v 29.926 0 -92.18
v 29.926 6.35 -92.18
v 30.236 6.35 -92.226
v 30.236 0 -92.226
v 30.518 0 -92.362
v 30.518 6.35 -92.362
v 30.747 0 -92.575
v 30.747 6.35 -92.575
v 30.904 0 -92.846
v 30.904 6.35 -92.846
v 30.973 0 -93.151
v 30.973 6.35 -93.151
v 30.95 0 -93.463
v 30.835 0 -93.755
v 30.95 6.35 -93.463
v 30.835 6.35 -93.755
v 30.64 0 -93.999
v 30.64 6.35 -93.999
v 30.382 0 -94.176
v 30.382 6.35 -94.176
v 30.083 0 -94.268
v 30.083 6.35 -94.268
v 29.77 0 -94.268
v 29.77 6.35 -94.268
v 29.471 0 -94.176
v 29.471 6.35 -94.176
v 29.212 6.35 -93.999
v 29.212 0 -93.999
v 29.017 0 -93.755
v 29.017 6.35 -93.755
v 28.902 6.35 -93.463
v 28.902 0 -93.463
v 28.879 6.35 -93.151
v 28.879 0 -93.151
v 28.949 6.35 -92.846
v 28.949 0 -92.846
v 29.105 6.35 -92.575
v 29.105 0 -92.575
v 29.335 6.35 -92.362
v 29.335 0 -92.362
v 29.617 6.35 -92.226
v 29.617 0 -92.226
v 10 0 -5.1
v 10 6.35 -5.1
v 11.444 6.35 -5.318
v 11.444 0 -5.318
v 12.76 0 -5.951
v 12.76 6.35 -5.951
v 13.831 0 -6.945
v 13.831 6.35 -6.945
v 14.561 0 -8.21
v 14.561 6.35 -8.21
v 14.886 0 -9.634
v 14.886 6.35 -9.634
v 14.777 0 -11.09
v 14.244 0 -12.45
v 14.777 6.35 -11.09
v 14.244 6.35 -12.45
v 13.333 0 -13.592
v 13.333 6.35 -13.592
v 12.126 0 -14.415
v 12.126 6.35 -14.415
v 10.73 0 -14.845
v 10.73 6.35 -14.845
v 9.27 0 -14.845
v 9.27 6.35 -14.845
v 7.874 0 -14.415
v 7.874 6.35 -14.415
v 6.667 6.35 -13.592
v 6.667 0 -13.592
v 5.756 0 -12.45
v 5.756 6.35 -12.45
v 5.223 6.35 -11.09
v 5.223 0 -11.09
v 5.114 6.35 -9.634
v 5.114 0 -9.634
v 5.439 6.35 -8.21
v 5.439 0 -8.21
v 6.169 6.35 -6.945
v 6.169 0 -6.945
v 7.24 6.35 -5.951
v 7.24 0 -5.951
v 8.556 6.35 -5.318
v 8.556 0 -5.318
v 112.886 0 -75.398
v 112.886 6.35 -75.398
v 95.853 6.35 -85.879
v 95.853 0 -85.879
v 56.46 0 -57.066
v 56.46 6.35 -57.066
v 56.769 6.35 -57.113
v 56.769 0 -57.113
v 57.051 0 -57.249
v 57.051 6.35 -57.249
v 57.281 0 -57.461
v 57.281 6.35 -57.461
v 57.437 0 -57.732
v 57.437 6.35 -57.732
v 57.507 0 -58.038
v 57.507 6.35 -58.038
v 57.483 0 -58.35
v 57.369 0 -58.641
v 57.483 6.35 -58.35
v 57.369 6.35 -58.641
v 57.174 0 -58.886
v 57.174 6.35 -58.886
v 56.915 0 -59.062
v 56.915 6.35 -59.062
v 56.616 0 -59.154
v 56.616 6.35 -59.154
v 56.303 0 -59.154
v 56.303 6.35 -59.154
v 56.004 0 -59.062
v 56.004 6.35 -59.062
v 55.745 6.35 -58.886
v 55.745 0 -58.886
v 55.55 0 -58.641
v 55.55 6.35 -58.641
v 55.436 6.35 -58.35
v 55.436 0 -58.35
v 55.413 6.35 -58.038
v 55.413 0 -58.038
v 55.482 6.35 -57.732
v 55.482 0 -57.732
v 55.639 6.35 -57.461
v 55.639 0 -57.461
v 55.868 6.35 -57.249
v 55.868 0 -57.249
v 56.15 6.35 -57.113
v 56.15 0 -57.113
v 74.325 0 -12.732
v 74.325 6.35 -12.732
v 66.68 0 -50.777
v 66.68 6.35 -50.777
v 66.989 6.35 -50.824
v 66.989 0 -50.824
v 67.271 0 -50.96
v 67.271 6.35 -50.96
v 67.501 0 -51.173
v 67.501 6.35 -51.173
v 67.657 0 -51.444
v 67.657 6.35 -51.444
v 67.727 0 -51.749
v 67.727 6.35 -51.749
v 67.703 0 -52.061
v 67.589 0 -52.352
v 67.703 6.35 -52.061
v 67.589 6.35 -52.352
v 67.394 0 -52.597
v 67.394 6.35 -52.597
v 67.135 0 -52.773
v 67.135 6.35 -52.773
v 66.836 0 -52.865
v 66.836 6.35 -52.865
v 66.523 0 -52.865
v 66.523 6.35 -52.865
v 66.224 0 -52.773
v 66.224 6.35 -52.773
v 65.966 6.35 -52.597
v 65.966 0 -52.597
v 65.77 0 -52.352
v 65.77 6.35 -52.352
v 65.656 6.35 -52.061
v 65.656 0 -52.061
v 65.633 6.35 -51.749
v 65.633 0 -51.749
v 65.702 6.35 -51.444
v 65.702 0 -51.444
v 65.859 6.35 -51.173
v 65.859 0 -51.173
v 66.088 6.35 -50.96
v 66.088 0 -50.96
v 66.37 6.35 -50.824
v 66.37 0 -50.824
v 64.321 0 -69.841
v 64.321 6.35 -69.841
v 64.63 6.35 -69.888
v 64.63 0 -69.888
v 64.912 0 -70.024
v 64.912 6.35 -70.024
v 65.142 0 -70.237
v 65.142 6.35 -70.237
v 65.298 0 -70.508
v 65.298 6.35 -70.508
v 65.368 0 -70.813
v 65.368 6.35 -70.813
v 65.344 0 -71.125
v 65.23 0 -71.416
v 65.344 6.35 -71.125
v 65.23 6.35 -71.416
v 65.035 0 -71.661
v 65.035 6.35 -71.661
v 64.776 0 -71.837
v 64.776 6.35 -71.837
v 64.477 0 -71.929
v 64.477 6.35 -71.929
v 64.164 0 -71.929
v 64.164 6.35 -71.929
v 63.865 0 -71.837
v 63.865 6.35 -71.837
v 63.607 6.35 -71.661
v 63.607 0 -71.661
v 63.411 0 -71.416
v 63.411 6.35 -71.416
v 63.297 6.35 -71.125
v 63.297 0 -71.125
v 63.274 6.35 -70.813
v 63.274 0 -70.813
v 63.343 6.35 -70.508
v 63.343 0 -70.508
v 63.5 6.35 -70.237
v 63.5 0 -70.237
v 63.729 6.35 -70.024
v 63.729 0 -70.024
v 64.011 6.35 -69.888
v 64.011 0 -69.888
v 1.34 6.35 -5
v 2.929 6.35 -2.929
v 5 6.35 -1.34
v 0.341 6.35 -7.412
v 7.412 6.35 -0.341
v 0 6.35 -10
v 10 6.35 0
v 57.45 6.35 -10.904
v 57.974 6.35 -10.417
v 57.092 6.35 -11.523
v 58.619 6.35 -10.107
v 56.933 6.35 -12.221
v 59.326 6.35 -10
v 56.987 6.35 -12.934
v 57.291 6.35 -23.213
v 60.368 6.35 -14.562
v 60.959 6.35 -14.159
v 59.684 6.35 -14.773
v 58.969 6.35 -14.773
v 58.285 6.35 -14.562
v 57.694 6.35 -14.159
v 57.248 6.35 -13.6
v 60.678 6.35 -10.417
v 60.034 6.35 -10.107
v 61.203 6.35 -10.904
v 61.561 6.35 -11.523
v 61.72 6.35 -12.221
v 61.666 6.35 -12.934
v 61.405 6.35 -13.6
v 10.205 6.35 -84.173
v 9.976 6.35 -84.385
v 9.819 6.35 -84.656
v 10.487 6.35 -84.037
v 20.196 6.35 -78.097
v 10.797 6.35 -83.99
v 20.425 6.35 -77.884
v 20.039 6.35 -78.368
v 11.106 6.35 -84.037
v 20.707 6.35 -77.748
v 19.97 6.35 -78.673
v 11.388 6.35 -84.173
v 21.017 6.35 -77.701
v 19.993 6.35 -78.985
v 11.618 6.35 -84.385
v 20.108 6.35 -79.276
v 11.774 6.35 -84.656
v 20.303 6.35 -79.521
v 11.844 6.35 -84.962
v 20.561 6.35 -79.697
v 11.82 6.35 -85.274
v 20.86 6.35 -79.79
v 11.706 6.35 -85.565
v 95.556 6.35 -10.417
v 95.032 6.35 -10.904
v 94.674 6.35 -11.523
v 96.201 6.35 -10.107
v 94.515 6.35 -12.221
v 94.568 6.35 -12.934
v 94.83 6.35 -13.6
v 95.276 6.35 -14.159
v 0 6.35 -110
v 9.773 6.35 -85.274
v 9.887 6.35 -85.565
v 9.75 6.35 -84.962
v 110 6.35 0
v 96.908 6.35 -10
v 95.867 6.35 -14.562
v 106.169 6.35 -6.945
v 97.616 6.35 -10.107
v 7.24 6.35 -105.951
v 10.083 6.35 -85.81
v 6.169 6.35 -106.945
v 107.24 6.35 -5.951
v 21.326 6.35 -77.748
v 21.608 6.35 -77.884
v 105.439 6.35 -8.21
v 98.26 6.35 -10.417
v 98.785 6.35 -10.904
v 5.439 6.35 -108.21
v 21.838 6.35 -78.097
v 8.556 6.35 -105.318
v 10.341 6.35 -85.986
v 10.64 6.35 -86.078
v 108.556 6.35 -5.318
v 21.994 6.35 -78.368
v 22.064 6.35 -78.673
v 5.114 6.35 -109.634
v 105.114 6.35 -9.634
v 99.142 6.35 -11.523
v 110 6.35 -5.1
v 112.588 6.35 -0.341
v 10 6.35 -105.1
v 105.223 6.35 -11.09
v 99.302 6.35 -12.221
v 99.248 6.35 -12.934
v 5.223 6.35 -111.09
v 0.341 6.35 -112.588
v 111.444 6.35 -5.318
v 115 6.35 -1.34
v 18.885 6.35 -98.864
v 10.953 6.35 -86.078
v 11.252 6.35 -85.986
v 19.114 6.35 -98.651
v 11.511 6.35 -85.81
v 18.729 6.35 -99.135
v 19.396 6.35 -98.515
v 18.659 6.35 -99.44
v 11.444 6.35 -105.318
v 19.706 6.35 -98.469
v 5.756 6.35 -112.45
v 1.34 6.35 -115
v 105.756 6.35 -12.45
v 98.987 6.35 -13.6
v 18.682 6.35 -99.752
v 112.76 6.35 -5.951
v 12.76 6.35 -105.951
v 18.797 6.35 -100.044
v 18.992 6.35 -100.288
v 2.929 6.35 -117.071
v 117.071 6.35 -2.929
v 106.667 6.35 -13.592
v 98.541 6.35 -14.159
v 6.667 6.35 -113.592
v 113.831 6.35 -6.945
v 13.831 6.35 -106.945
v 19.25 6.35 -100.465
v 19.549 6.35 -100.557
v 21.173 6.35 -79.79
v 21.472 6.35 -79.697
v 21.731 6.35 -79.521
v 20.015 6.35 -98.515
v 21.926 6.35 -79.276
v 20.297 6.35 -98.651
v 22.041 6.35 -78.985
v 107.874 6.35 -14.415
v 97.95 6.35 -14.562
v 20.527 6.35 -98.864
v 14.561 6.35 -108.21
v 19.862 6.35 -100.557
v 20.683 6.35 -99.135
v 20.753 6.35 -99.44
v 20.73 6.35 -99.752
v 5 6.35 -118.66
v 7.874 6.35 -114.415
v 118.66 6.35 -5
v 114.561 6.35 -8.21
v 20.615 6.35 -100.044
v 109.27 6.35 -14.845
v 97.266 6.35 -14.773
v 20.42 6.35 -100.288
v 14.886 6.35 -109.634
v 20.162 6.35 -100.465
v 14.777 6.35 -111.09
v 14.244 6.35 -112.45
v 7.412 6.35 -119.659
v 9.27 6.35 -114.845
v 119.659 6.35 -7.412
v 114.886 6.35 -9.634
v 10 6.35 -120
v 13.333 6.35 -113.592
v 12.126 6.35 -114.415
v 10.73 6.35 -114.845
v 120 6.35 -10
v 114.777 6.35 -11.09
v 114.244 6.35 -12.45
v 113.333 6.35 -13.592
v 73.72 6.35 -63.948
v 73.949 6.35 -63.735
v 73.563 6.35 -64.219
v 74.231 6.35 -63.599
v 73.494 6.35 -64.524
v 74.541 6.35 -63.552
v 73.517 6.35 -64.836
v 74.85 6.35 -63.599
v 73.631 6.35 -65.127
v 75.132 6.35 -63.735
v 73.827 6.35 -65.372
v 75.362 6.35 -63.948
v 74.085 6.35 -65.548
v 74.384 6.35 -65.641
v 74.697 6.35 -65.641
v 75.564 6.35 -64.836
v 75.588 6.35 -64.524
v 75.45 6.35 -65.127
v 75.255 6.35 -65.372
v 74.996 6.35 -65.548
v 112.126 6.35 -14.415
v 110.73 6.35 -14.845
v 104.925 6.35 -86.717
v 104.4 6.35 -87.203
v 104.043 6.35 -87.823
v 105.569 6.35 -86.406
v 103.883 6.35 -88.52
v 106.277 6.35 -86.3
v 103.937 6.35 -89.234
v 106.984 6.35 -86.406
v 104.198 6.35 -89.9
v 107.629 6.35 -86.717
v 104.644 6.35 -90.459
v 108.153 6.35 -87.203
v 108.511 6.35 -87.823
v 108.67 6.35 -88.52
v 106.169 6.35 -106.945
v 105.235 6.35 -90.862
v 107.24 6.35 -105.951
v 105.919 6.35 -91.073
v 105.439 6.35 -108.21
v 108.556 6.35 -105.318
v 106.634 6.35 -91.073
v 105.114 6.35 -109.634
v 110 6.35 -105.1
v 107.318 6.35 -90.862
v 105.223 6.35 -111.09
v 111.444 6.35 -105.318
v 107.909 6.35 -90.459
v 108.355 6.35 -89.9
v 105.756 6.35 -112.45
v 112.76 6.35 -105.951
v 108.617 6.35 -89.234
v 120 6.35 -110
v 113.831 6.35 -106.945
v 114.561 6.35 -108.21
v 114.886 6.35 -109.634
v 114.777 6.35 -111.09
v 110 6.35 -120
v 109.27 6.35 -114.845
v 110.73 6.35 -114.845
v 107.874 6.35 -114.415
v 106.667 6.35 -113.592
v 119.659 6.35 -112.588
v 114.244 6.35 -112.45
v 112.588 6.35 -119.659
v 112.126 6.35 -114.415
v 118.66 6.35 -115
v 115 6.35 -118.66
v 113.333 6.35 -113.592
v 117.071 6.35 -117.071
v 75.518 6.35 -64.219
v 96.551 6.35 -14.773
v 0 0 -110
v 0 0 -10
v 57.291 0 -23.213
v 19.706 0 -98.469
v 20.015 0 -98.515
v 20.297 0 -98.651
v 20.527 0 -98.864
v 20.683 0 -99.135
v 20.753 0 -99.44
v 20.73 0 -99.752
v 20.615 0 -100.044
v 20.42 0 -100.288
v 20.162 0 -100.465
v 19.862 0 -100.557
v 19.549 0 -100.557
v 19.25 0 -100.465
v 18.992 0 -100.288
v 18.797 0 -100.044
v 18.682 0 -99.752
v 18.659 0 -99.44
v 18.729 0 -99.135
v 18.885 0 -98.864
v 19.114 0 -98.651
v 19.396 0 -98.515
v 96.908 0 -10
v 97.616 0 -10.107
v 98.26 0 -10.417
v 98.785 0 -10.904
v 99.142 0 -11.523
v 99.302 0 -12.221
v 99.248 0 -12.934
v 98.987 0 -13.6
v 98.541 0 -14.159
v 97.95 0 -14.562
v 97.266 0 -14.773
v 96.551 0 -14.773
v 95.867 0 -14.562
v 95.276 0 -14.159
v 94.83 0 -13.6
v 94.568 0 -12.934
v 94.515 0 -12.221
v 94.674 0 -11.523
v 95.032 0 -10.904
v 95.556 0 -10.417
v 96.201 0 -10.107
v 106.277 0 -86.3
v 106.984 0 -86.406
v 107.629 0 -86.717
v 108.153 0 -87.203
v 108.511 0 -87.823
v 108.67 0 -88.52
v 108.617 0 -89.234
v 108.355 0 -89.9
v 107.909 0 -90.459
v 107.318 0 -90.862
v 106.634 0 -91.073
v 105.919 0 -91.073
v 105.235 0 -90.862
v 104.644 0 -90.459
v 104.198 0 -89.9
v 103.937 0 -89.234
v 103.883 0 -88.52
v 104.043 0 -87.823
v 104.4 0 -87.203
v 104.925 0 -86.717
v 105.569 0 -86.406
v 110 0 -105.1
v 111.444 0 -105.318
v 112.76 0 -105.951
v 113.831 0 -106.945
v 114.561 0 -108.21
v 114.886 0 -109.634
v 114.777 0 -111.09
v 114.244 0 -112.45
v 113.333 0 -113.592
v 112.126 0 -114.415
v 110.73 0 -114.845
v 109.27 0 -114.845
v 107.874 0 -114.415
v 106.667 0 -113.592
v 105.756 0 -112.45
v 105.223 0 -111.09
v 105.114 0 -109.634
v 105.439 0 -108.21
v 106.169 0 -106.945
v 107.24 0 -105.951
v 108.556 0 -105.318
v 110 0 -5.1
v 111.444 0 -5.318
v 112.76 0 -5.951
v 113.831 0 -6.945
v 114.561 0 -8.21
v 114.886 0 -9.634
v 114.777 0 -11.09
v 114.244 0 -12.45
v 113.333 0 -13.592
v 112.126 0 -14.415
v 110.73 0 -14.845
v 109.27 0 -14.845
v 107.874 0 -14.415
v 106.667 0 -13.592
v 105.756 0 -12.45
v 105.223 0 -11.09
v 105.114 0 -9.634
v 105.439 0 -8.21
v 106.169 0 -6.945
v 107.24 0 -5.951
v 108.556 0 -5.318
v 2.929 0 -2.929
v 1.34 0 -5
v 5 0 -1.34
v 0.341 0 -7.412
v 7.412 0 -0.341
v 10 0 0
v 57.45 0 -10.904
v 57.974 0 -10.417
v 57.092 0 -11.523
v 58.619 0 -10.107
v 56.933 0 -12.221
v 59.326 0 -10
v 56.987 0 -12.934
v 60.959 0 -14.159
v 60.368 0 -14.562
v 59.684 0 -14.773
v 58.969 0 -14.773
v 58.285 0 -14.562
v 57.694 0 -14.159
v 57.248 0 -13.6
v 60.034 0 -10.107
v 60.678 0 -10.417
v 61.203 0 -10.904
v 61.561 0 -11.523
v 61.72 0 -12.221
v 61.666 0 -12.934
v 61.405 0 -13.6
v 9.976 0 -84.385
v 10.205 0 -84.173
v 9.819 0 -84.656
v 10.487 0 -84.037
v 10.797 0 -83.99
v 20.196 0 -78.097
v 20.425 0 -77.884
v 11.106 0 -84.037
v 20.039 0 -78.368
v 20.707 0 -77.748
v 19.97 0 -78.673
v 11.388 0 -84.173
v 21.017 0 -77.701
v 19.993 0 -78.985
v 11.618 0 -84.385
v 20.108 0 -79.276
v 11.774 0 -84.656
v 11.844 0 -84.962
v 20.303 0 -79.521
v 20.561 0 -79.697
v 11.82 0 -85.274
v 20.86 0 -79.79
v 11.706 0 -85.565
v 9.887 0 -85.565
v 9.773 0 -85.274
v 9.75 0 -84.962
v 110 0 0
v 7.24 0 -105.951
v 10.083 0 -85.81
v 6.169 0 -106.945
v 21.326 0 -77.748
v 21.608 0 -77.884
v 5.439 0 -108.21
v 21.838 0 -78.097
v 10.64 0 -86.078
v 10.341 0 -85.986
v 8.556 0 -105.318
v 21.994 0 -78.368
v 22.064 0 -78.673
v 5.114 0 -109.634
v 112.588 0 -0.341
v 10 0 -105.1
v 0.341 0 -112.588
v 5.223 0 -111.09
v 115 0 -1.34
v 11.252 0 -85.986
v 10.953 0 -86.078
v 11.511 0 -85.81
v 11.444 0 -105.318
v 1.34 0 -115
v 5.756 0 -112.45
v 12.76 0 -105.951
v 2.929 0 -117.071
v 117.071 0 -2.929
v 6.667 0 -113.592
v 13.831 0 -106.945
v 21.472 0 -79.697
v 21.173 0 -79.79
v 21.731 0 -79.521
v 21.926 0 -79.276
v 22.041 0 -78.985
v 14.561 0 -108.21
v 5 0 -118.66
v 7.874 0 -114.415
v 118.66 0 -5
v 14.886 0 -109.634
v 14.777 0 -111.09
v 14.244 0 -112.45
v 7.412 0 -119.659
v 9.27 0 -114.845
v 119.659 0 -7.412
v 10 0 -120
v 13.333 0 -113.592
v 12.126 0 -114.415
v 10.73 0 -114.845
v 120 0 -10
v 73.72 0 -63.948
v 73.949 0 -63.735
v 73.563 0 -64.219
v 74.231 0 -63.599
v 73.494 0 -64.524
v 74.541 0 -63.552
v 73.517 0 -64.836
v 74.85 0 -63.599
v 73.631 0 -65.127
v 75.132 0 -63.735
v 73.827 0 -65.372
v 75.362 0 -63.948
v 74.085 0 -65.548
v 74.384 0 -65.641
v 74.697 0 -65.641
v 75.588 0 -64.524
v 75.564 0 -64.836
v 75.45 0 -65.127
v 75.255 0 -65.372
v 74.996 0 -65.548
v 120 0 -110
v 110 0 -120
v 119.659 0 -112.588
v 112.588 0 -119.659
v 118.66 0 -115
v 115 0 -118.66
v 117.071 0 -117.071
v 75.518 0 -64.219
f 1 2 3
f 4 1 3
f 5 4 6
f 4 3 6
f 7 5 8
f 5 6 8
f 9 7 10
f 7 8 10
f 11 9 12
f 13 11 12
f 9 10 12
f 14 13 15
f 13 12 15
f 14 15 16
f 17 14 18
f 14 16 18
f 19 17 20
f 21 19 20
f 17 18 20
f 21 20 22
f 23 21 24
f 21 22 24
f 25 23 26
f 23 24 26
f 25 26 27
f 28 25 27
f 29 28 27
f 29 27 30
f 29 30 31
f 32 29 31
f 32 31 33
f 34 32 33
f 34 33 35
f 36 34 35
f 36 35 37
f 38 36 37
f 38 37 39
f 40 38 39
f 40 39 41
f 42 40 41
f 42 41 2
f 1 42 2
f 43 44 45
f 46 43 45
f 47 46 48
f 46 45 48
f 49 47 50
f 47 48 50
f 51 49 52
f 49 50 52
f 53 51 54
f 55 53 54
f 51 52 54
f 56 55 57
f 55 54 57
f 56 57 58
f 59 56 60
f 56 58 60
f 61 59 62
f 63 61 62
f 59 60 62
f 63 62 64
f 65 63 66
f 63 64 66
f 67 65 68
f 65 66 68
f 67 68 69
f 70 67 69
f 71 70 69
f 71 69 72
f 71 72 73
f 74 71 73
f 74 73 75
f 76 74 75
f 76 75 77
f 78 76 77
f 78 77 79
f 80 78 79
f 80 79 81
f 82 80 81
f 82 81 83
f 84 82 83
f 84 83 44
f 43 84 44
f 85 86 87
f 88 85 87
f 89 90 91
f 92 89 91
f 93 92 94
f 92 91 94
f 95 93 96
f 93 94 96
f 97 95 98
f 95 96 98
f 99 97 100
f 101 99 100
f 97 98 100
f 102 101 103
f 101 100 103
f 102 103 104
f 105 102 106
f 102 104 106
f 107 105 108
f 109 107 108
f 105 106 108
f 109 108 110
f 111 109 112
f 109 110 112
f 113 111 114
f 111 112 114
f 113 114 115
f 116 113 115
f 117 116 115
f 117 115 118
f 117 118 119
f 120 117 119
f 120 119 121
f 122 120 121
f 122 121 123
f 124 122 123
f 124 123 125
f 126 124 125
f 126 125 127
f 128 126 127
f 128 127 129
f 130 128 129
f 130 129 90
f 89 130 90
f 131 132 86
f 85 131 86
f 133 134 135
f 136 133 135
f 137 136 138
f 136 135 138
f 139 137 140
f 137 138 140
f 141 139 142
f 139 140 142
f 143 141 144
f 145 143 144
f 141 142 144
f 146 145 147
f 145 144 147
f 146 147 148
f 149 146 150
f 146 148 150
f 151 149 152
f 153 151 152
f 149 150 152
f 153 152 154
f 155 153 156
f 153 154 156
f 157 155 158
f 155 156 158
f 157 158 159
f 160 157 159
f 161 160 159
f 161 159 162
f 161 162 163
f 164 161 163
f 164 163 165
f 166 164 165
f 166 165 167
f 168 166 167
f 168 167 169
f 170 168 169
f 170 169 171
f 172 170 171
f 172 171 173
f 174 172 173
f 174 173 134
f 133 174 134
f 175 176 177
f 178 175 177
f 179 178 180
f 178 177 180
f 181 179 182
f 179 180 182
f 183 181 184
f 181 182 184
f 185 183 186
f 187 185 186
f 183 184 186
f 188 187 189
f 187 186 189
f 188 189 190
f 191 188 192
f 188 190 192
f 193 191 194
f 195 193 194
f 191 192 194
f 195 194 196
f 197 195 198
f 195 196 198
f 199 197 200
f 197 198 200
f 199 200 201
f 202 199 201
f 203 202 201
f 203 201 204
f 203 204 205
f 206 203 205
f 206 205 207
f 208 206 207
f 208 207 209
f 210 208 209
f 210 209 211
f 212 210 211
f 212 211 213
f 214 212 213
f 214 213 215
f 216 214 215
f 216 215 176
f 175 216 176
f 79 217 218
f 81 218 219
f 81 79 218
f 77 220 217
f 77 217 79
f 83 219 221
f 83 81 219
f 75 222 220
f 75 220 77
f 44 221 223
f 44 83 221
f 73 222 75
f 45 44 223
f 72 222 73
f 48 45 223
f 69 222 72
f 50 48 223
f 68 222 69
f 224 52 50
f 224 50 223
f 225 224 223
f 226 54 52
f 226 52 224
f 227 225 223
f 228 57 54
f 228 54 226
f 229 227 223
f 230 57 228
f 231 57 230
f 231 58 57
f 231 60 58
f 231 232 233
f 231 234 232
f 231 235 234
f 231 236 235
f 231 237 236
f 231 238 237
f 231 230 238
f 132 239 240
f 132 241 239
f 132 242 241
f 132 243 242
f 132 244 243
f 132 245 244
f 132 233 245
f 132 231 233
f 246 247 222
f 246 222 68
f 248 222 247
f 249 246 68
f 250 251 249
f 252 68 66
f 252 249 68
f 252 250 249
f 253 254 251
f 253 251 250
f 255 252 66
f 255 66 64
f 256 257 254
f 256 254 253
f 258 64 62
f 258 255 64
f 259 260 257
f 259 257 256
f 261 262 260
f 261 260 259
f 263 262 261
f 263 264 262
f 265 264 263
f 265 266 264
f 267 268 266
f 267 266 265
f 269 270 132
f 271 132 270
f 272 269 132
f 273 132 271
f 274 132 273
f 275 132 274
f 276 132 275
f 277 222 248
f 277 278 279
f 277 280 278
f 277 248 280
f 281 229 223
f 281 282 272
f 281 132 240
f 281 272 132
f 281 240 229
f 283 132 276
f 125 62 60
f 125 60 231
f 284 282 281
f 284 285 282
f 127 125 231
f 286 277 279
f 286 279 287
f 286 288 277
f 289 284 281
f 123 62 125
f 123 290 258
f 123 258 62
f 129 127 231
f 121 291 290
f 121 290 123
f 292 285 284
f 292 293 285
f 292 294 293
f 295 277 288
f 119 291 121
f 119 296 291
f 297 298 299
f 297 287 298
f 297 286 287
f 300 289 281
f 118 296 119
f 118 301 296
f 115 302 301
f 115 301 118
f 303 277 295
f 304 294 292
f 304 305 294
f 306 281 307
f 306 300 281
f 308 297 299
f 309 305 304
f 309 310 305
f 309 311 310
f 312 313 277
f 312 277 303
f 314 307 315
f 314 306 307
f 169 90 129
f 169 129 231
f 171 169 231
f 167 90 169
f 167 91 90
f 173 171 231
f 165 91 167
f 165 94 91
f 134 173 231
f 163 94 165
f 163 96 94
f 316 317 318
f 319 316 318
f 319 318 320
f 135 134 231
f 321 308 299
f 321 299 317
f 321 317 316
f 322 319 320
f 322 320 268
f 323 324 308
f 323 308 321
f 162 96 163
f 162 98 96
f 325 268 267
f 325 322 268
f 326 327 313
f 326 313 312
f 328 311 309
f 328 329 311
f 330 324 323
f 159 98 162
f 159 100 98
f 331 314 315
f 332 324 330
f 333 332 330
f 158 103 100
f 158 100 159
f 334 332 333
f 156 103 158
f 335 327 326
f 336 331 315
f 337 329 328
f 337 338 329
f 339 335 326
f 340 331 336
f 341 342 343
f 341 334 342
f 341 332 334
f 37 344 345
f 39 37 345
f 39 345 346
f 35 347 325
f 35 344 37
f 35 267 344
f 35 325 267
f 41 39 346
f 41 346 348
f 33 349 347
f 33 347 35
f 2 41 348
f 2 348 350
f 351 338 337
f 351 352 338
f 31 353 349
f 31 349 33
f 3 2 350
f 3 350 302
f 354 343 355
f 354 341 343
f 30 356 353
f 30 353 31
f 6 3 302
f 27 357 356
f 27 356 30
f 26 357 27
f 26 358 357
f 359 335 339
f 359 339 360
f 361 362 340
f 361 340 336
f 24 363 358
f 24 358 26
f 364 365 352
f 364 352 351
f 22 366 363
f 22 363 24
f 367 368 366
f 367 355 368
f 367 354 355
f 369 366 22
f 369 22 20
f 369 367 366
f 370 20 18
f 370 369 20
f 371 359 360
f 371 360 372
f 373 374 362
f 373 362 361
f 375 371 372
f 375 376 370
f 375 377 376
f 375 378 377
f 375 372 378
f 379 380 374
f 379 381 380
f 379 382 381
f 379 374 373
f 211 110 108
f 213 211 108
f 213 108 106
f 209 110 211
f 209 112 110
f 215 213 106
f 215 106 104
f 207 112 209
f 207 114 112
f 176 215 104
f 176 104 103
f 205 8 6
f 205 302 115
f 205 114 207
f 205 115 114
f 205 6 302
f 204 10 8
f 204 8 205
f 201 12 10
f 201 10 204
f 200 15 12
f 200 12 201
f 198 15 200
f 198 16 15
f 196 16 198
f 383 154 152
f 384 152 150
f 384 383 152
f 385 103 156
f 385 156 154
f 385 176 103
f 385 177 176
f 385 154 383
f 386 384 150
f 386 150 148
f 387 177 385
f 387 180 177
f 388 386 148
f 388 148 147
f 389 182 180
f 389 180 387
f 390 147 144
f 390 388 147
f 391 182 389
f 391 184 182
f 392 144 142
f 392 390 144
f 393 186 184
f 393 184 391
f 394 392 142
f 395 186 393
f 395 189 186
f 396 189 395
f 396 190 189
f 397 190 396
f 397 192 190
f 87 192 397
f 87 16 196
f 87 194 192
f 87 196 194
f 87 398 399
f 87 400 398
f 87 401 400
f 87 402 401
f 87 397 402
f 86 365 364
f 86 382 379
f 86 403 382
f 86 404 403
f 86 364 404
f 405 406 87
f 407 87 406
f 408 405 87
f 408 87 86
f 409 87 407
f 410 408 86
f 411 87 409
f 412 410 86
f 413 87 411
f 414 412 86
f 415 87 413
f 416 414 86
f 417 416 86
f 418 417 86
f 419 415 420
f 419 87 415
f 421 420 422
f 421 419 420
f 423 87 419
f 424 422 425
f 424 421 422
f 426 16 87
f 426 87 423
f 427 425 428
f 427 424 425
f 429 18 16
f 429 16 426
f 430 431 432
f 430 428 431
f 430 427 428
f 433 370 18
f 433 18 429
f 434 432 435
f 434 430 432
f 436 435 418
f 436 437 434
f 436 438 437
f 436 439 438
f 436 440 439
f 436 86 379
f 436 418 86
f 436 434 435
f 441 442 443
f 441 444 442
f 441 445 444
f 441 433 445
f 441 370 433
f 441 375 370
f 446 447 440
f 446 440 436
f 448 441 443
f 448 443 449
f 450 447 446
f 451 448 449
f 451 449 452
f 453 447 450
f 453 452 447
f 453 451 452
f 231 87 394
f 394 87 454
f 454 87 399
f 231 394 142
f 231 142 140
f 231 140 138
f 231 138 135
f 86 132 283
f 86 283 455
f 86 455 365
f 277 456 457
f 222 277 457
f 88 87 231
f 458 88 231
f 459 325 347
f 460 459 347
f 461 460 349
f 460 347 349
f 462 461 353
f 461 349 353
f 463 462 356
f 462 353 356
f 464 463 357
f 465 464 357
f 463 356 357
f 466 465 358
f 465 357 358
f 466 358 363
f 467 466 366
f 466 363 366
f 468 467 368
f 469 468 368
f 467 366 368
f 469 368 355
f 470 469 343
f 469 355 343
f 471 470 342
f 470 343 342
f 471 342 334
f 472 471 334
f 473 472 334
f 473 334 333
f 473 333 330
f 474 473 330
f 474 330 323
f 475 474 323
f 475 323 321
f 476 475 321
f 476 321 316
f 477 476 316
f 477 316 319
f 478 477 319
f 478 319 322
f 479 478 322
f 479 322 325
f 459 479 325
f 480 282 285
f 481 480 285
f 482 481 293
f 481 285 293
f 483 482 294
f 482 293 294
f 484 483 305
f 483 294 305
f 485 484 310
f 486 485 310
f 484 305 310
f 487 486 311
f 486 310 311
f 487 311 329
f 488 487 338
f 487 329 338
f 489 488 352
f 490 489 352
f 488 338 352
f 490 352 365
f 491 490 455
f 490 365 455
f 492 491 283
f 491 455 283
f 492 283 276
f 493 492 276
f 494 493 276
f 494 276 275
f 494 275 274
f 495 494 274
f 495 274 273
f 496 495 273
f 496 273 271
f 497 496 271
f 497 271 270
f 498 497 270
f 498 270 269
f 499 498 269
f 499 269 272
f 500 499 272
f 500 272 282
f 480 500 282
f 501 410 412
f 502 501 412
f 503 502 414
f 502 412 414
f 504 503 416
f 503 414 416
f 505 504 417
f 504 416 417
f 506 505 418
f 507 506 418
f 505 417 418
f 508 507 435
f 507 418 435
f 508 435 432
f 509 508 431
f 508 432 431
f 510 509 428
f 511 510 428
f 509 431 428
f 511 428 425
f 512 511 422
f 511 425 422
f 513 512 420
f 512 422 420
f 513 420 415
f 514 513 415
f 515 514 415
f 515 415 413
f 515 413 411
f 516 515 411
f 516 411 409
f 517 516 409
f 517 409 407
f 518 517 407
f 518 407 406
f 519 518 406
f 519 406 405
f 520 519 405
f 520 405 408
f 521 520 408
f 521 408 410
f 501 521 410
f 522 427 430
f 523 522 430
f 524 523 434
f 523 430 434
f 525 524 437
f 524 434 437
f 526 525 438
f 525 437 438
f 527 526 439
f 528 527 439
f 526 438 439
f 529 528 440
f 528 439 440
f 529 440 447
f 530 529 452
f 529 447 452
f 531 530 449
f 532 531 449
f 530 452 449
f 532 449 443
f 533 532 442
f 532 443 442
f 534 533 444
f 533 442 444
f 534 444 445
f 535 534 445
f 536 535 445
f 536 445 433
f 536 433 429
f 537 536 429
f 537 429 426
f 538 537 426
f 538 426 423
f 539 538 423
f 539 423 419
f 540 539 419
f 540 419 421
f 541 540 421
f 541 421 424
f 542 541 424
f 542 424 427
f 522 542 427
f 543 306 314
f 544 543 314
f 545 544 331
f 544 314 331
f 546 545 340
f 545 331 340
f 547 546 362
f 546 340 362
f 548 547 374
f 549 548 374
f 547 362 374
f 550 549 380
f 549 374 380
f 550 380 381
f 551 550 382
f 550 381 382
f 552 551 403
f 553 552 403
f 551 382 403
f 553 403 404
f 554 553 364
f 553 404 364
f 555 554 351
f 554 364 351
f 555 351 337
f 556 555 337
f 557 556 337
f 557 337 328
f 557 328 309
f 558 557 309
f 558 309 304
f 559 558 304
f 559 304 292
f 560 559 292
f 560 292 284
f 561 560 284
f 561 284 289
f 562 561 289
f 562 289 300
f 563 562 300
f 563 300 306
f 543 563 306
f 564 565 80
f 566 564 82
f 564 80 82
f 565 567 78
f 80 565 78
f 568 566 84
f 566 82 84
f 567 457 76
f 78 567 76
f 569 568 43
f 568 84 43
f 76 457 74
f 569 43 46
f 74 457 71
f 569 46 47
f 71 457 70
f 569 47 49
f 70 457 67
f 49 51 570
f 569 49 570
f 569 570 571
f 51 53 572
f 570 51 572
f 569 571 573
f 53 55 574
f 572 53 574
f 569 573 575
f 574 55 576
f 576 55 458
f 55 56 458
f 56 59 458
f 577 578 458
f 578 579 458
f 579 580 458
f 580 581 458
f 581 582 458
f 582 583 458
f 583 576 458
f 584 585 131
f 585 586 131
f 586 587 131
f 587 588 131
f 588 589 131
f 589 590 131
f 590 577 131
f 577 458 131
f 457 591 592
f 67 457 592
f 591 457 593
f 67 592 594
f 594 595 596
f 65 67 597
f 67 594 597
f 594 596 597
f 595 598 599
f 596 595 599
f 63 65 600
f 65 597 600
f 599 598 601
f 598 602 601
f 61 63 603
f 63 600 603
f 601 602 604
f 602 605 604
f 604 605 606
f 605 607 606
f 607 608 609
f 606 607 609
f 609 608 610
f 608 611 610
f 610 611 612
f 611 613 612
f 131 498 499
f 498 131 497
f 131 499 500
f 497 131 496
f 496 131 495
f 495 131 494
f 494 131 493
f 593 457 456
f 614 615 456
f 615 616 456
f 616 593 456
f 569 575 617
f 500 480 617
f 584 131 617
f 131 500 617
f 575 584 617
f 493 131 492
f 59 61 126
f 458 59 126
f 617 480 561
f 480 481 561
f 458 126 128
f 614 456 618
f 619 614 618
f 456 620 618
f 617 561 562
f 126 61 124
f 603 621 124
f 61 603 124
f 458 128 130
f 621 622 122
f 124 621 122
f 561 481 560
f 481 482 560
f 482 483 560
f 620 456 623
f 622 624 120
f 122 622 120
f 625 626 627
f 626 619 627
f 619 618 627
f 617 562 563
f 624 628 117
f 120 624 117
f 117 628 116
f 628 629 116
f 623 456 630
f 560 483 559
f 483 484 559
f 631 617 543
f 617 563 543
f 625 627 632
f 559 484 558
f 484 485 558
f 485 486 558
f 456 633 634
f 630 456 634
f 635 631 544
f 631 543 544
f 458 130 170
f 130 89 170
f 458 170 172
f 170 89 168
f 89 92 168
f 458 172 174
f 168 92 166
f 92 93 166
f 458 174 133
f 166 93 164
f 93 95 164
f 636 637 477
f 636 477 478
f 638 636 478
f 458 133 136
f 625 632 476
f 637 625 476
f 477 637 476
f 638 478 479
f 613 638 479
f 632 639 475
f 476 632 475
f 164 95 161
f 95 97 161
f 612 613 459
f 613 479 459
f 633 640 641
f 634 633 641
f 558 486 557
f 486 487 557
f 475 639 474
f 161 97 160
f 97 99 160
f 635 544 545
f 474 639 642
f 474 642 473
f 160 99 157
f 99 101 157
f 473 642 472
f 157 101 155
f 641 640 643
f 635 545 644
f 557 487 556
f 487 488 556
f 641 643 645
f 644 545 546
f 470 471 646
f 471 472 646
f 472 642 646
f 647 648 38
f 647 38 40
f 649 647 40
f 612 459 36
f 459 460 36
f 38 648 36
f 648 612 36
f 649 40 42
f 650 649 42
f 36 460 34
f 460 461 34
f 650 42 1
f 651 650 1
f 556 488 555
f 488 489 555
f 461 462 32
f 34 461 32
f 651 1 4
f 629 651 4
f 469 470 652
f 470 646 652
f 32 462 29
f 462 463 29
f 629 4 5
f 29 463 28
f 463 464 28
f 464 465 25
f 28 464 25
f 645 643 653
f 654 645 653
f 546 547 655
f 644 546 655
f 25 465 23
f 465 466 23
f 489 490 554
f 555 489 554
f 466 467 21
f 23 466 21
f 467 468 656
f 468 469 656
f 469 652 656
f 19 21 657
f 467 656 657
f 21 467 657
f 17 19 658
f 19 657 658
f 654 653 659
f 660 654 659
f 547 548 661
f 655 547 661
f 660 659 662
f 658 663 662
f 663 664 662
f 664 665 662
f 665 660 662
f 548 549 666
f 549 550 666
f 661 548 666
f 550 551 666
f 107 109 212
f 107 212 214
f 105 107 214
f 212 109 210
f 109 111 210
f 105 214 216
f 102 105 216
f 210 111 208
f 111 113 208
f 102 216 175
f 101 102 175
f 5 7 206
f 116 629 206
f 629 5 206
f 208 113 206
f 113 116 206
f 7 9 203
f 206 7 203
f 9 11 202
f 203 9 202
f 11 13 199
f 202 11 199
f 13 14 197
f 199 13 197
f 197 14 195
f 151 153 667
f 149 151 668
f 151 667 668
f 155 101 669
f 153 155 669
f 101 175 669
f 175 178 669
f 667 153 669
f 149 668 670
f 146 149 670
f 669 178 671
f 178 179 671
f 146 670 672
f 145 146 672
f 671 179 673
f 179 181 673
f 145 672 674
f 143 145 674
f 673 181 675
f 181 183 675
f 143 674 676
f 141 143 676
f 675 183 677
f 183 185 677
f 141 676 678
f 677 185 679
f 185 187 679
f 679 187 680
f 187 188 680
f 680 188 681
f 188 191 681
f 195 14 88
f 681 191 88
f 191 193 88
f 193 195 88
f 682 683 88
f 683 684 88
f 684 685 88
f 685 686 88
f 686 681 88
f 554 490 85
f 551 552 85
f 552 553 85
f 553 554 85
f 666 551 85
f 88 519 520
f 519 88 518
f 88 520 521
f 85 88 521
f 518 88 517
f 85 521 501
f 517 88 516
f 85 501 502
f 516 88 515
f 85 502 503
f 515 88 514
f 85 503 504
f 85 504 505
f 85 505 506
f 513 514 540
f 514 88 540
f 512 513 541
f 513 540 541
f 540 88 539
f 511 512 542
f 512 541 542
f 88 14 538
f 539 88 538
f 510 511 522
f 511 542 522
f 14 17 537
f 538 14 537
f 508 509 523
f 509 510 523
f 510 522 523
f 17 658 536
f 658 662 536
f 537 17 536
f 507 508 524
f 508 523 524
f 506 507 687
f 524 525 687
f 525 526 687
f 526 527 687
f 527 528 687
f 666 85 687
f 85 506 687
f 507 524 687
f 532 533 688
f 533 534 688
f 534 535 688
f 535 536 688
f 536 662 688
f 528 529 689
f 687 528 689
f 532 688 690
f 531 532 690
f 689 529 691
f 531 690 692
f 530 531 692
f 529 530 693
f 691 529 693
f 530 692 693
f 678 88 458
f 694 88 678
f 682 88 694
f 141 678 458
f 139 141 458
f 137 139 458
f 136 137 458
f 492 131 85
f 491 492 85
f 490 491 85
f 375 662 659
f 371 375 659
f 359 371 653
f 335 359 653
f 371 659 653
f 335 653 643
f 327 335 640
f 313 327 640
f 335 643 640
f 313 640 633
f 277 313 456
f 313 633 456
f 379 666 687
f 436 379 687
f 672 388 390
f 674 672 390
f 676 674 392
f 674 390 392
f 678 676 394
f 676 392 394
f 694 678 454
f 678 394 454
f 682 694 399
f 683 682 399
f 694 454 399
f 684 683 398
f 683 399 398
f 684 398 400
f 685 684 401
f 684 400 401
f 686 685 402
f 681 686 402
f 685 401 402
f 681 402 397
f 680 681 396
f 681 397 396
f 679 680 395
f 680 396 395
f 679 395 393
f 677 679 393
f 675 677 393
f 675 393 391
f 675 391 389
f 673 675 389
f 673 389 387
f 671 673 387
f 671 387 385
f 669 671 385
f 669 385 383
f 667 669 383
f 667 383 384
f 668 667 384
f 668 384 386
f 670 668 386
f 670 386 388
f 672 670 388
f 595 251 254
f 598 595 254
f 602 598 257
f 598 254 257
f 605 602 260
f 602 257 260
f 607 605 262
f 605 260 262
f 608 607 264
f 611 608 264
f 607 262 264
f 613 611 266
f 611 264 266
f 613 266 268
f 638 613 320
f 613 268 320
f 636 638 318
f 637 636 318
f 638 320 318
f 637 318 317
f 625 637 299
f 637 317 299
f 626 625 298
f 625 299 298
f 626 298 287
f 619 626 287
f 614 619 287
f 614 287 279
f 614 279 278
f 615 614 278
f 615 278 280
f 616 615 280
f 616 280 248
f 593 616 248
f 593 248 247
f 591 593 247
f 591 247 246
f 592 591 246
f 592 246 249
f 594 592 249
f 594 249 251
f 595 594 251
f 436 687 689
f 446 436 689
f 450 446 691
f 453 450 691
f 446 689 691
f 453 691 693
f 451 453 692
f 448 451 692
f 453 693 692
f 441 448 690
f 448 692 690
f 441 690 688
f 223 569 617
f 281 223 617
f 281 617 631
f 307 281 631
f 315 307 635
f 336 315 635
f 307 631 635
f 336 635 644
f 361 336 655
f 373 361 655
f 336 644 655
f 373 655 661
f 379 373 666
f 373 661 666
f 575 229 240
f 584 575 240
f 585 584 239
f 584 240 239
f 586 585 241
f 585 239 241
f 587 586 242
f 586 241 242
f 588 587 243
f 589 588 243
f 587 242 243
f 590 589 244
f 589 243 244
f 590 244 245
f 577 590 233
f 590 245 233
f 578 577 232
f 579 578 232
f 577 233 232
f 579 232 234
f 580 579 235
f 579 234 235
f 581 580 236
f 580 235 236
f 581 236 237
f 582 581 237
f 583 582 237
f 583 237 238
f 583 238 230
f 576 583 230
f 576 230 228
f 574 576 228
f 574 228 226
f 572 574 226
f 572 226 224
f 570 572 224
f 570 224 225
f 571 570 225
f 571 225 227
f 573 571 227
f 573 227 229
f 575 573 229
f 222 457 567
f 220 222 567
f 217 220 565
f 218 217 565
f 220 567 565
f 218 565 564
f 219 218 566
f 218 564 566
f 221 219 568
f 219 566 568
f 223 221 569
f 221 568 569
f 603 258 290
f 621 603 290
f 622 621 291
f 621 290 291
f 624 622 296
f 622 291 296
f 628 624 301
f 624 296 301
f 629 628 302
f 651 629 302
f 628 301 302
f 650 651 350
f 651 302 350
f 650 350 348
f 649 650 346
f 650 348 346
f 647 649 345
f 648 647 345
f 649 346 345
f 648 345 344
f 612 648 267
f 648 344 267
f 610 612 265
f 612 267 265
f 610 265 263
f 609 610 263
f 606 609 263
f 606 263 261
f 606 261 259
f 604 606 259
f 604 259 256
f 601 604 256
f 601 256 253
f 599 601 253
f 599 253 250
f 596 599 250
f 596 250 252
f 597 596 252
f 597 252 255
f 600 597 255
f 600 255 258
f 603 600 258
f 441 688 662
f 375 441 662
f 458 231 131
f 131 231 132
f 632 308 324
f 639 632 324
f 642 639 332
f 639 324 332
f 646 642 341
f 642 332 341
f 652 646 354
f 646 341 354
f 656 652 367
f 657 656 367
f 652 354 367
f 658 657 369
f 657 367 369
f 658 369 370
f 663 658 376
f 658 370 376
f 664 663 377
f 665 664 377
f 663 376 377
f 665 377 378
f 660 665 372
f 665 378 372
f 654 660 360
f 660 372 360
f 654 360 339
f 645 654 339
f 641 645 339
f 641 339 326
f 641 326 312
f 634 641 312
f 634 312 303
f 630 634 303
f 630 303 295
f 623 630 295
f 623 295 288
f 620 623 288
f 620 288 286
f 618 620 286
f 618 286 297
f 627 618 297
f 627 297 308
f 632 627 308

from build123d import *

# Parameters (mm, degrees)
BOSS_EXTRUDE1_DEPTH = 6.35
SKETCH2_R           = 2.4
SKETCH2_R_2         = 4.9
CUT_EXTRUDE1_DEPTH  = 170.824387236
SKETCH5_R           = 1.05
CUT_EXTRUDE2_DEPTH  = 170.824387236


with BuildPart() as part:
    # Sketch1 → Boss-Extrude1 (new body)
    with BuildSketch(Plane(origin=(0, 0, 0), x_dir=(1, 0, 0), z_dir=(0, 1, 0))):
        with BuildLine():
            Line((10, 0), (110, 0))
            ThreePointArc((110, 0), (117.071067812, 2.928932188), (120, 10))
            Line((120, 10), (120, 110))
            ThreePointArc((120, 110), (117.071067812, 117.071067812), (110, 120))
            Line((110, 120), (10, 120))
            ThreePointArc((10, 120), (2.928932188, 117.071067812), (0, 110))
            Line((0, 110), (0, 10))
            ThreePointArc((0, 10), (2.928932188, 2.928932188), (10, 0))
        make_face()
    extrude(amount=BOSS_EXTRUDE1_DEPTH)

    # Sketch2 → Cut-Extrude1 (cut, through all)
    with BuildSketch(Plane(origin=(0, 6.35, 0), x_dir=(1, 0, 0), z_dir=(0, 1, 0))):
        with Locations(Location((59.326447526, 12.4, 0), (0, 0, 270))):
            Circle(SKETCH2_R)
        with Locations(Location((96.90831454, 12.4, 0), (0, 0, 270))):
            Circle(SKETCH2_R)
        with Locations(Location((106.276743553, 88.69973137, 0), (0, 0, 270))):
            Circle(SKETCH2_R)
        with Locations(Location((10, 110, 0), (0, 0, 270))):
            Circle(SKETCH2_R_2)
        with Locations(Location((10, 10, 0), (0, 0, 270))):
            Circle(SKETCH2_R_2)
        with Locations(Location((110, 110, 0), (0, 0, 270))):
            Circle(SKETCH2_R_2)
        with Locations(Location((110, 10, 0), (0, 0, 270))):
            Circle(SKETCH2_R_2)
        Polygon((57.291464341, 23.213164461), (74.324967949, 12.731764037), (112.886040109, 75.398023809), (95.852536501, 85.879424234), align=None)
    extrude(amount=-CUT_EXTRUDE1_DEPTH, mode=Mode.SUBTRACT)

    # Sketch5 → Cut-Extrude2 (cut, through all)
    with BuildSketch(Plane(origin=(0, 6.35, 0), x_dir=(1, 0, 0), z_dir=(0, 1, 0))):
        with Locations(Location((66.679748999, 51.827220643, 0), (0, 0, 270))):
            Circle(SKETCH5_R)
        with Locations(Location((56.459646835, 58.116060898, 0), (0, 0, 270))):
            Circle(SKETCH5_R)
        with Locations(Location((74.540799318, 64.602348349, 0), (0, 0, 270))):
            Circle(SKETCH5_R)
        with Locations(Location((64.320697153, 70.891188603, 0), (0, 0, 270))):
            Circle(SKETCH5_R)
        with Locations(Location((10.796792254, 85.040096841, 0), (0, 0, 270))):
            Circle(SKETCH5_R)
        with Locations(Location((21.016894418, 78.751256587, 0), (0, 0, 270))):
            Circle(SKETCH5_R)
        with Locations(Location((29.926084779, 93.229734653, 0), (0, 0, 270))):
            Circle(SKETCH5_R)
        with Locations(Location((19.705982614, 99.518574908, 0), (0, 0, 270))):
            Circle(SKETCH5_R)
    extrude(amount=-CUT_EXTRUDE2_DEPTH, mode=Mode.SUBTRACT)


solid = part.part
